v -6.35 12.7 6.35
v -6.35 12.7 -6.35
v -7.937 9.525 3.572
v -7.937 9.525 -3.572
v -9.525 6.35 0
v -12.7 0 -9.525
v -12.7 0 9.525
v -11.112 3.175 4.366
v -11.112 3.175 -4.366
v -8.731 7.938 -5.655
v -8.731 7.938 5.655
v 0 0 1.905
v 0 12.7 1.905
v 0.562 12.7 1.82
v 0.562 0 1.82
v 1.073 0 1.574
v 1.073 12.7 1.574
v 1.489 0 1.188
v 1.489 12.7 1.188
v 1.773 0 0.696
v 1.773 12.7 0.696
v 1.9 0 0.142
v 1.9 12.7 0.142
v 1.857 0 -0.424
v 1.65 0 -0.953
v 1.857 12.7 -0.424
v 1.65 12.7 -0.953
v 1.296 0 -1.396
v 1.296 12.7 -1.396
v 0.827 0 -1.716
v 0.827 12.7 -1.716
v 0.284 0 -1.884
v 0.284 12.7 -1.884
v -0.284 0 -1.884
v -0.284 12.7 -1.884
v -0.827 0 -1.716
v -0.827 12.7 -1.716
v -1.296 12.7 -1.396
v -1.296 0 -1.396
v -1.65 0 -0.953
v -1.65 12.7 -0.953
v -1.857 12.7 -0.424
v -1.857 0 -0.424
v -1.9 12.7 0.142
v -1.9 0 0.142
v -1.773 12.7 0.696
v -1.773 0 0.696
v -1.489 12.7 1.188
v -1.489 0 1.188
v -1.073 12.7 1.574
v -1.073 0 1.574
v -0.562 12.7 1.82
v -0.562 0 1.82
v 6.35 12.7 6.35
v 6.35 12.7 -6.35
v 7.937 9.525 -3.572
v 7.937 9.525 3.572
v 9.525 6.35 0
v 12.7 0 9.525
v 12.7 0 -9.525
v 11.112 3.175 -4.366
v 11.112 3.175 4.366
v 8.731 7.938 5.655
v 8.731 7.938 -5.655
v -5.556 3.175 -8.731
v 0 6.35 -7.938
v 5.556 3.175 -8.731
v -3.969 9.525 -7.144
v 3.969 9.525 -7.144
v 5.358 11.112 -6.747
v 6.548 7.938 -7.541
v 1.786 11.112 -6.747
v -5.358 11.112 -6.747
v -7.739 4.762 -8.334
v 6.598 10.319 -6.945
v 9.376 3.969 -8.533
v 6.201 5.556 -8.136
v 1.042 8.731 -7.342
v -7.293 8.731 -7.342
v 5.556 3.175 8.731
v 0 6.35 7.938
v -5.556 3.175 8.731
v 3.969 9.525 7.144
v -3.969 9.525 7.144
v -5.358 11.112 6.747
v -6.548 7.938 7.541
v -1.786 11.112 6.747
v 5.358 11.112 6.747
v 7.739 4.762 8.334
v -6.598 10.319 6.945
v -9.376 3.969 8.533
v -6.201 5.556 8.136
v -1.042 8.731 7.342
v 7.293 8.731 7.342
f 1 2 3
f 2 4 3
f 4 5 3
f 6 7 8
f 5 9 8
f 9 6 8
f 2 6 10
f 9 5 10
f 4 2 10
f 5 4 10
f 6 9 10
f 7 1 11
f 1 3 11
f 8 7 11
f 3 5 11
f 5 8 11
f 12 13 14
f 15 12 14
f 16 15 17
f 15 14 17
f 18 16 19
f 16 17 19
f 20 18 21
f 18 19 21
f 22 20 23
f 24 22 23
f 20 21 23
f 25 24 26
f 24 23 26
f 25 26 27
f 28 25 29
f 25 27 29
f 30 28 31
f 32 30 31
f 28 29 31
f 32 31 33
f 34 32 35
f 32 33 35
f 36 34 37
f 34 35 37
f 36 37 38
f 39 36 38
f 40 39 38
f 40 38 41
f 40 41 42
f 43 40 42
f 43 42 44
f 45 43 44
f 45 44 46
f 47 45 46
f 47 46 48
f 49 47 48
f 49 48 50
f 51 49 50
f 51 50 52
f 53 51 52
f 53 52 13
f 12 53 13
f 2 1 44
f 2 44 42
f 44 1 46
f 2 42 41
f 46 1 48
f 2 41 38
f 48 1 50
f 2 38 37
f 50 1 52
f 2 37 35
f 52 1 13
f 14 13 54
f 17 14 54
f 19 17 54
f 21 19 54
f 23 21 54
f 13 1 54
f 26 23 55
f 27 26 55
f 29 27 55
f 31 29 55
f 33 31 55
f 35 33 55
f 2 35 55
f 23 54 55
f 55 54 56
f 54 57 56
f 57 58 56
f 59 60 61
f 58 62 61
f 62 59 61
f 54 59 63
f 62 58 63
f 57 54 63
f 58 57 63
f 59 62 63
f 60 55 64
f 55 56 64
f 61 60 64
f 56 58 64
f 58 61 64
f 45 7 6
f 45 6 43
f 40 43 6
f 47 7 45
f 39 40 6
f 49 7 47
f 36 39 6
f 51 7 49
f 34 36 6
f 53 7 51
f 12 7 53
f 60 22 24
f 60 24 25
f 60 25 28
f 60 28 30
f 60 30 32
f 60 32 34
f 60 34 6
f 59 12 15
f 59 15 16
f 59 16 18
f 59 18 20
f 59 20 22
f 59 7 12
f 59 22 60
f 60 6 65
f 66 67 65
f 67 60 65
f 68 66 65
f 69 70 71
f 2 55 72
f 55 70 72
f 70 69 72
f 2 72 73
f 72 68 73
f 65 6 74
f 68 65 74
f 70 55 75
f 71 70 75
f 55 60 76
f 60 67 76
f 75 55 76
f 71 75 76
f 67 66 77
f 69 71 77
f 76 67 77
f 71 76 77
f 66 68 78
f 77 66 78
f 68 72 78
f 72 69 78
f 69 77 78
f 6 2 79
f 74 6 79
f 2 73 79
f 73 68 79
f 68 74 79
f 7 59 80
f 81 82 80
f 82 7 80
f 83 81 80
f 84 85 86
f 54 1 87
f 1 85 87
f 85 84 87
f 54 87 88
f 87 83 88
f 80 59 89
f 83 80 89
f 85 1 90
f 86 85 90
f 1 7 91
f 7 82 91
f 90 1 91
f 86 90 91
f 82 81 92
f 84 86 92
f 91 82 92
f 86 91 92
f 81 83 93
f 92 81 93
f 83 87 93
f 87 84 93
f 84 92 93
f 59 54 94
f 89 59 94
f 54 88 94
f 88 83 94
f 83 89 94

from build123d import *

# Parameters (mm, degrees)
SKETCH3_R          = 1.905
CUT_EXTRUDE1_DEPTH = 21.329919626


with BuildPart() as part:
    # Sketch2 → Loft1 section 0
    with BuildSketch(Plane(origin=(0, 12.7, 0), x_dir=(1, 0, 0), z_dir=(0, 1, 0))):
        with BuildLine():
            Line((-6.35, -6.35), (6.35, -6.35))
            Line((6.35, -6.35), (6.35, 6.35))
            Line((6.35, 6.35), (-6.35, 6.35))
            Line((-6.35, 6.35), (-6.35, -6.35))
        make_face()
    # Sketch1 → Loft1 section 1
    with BuildSketch(Plane(origin=(0, 0, 0), x_dir=(1, 0, 0), z_dir=(0, 1, 0))):
        with BuildLine():
            Line((-12.7, -9.525), (12.7, -9.525))
            Line((12.7, -9.525), (12.7, 9.525))
            Line((12.7, 9.525), (-12.7, 9.525))
            Line((-12.7, 9.525), (-12.7, -9.525))
        make_face()
    loft()

    # Sketch3 → Cut-Extrude1 (cut, through all)
    with BuildSketch(Plane(origin=(0, 12.7, 0), x_dir=(1, 0, 0), z_dir=(0, 1, 0))):
        with Locations(Location((0, 0, 0), (0, 0, 270))):
            Circle(SKETCH3_R)
    extrude(amount=-CUT_EXTRUDE1_DEPTH, mode=Mode.SUBTRACT)


solid = part.part
